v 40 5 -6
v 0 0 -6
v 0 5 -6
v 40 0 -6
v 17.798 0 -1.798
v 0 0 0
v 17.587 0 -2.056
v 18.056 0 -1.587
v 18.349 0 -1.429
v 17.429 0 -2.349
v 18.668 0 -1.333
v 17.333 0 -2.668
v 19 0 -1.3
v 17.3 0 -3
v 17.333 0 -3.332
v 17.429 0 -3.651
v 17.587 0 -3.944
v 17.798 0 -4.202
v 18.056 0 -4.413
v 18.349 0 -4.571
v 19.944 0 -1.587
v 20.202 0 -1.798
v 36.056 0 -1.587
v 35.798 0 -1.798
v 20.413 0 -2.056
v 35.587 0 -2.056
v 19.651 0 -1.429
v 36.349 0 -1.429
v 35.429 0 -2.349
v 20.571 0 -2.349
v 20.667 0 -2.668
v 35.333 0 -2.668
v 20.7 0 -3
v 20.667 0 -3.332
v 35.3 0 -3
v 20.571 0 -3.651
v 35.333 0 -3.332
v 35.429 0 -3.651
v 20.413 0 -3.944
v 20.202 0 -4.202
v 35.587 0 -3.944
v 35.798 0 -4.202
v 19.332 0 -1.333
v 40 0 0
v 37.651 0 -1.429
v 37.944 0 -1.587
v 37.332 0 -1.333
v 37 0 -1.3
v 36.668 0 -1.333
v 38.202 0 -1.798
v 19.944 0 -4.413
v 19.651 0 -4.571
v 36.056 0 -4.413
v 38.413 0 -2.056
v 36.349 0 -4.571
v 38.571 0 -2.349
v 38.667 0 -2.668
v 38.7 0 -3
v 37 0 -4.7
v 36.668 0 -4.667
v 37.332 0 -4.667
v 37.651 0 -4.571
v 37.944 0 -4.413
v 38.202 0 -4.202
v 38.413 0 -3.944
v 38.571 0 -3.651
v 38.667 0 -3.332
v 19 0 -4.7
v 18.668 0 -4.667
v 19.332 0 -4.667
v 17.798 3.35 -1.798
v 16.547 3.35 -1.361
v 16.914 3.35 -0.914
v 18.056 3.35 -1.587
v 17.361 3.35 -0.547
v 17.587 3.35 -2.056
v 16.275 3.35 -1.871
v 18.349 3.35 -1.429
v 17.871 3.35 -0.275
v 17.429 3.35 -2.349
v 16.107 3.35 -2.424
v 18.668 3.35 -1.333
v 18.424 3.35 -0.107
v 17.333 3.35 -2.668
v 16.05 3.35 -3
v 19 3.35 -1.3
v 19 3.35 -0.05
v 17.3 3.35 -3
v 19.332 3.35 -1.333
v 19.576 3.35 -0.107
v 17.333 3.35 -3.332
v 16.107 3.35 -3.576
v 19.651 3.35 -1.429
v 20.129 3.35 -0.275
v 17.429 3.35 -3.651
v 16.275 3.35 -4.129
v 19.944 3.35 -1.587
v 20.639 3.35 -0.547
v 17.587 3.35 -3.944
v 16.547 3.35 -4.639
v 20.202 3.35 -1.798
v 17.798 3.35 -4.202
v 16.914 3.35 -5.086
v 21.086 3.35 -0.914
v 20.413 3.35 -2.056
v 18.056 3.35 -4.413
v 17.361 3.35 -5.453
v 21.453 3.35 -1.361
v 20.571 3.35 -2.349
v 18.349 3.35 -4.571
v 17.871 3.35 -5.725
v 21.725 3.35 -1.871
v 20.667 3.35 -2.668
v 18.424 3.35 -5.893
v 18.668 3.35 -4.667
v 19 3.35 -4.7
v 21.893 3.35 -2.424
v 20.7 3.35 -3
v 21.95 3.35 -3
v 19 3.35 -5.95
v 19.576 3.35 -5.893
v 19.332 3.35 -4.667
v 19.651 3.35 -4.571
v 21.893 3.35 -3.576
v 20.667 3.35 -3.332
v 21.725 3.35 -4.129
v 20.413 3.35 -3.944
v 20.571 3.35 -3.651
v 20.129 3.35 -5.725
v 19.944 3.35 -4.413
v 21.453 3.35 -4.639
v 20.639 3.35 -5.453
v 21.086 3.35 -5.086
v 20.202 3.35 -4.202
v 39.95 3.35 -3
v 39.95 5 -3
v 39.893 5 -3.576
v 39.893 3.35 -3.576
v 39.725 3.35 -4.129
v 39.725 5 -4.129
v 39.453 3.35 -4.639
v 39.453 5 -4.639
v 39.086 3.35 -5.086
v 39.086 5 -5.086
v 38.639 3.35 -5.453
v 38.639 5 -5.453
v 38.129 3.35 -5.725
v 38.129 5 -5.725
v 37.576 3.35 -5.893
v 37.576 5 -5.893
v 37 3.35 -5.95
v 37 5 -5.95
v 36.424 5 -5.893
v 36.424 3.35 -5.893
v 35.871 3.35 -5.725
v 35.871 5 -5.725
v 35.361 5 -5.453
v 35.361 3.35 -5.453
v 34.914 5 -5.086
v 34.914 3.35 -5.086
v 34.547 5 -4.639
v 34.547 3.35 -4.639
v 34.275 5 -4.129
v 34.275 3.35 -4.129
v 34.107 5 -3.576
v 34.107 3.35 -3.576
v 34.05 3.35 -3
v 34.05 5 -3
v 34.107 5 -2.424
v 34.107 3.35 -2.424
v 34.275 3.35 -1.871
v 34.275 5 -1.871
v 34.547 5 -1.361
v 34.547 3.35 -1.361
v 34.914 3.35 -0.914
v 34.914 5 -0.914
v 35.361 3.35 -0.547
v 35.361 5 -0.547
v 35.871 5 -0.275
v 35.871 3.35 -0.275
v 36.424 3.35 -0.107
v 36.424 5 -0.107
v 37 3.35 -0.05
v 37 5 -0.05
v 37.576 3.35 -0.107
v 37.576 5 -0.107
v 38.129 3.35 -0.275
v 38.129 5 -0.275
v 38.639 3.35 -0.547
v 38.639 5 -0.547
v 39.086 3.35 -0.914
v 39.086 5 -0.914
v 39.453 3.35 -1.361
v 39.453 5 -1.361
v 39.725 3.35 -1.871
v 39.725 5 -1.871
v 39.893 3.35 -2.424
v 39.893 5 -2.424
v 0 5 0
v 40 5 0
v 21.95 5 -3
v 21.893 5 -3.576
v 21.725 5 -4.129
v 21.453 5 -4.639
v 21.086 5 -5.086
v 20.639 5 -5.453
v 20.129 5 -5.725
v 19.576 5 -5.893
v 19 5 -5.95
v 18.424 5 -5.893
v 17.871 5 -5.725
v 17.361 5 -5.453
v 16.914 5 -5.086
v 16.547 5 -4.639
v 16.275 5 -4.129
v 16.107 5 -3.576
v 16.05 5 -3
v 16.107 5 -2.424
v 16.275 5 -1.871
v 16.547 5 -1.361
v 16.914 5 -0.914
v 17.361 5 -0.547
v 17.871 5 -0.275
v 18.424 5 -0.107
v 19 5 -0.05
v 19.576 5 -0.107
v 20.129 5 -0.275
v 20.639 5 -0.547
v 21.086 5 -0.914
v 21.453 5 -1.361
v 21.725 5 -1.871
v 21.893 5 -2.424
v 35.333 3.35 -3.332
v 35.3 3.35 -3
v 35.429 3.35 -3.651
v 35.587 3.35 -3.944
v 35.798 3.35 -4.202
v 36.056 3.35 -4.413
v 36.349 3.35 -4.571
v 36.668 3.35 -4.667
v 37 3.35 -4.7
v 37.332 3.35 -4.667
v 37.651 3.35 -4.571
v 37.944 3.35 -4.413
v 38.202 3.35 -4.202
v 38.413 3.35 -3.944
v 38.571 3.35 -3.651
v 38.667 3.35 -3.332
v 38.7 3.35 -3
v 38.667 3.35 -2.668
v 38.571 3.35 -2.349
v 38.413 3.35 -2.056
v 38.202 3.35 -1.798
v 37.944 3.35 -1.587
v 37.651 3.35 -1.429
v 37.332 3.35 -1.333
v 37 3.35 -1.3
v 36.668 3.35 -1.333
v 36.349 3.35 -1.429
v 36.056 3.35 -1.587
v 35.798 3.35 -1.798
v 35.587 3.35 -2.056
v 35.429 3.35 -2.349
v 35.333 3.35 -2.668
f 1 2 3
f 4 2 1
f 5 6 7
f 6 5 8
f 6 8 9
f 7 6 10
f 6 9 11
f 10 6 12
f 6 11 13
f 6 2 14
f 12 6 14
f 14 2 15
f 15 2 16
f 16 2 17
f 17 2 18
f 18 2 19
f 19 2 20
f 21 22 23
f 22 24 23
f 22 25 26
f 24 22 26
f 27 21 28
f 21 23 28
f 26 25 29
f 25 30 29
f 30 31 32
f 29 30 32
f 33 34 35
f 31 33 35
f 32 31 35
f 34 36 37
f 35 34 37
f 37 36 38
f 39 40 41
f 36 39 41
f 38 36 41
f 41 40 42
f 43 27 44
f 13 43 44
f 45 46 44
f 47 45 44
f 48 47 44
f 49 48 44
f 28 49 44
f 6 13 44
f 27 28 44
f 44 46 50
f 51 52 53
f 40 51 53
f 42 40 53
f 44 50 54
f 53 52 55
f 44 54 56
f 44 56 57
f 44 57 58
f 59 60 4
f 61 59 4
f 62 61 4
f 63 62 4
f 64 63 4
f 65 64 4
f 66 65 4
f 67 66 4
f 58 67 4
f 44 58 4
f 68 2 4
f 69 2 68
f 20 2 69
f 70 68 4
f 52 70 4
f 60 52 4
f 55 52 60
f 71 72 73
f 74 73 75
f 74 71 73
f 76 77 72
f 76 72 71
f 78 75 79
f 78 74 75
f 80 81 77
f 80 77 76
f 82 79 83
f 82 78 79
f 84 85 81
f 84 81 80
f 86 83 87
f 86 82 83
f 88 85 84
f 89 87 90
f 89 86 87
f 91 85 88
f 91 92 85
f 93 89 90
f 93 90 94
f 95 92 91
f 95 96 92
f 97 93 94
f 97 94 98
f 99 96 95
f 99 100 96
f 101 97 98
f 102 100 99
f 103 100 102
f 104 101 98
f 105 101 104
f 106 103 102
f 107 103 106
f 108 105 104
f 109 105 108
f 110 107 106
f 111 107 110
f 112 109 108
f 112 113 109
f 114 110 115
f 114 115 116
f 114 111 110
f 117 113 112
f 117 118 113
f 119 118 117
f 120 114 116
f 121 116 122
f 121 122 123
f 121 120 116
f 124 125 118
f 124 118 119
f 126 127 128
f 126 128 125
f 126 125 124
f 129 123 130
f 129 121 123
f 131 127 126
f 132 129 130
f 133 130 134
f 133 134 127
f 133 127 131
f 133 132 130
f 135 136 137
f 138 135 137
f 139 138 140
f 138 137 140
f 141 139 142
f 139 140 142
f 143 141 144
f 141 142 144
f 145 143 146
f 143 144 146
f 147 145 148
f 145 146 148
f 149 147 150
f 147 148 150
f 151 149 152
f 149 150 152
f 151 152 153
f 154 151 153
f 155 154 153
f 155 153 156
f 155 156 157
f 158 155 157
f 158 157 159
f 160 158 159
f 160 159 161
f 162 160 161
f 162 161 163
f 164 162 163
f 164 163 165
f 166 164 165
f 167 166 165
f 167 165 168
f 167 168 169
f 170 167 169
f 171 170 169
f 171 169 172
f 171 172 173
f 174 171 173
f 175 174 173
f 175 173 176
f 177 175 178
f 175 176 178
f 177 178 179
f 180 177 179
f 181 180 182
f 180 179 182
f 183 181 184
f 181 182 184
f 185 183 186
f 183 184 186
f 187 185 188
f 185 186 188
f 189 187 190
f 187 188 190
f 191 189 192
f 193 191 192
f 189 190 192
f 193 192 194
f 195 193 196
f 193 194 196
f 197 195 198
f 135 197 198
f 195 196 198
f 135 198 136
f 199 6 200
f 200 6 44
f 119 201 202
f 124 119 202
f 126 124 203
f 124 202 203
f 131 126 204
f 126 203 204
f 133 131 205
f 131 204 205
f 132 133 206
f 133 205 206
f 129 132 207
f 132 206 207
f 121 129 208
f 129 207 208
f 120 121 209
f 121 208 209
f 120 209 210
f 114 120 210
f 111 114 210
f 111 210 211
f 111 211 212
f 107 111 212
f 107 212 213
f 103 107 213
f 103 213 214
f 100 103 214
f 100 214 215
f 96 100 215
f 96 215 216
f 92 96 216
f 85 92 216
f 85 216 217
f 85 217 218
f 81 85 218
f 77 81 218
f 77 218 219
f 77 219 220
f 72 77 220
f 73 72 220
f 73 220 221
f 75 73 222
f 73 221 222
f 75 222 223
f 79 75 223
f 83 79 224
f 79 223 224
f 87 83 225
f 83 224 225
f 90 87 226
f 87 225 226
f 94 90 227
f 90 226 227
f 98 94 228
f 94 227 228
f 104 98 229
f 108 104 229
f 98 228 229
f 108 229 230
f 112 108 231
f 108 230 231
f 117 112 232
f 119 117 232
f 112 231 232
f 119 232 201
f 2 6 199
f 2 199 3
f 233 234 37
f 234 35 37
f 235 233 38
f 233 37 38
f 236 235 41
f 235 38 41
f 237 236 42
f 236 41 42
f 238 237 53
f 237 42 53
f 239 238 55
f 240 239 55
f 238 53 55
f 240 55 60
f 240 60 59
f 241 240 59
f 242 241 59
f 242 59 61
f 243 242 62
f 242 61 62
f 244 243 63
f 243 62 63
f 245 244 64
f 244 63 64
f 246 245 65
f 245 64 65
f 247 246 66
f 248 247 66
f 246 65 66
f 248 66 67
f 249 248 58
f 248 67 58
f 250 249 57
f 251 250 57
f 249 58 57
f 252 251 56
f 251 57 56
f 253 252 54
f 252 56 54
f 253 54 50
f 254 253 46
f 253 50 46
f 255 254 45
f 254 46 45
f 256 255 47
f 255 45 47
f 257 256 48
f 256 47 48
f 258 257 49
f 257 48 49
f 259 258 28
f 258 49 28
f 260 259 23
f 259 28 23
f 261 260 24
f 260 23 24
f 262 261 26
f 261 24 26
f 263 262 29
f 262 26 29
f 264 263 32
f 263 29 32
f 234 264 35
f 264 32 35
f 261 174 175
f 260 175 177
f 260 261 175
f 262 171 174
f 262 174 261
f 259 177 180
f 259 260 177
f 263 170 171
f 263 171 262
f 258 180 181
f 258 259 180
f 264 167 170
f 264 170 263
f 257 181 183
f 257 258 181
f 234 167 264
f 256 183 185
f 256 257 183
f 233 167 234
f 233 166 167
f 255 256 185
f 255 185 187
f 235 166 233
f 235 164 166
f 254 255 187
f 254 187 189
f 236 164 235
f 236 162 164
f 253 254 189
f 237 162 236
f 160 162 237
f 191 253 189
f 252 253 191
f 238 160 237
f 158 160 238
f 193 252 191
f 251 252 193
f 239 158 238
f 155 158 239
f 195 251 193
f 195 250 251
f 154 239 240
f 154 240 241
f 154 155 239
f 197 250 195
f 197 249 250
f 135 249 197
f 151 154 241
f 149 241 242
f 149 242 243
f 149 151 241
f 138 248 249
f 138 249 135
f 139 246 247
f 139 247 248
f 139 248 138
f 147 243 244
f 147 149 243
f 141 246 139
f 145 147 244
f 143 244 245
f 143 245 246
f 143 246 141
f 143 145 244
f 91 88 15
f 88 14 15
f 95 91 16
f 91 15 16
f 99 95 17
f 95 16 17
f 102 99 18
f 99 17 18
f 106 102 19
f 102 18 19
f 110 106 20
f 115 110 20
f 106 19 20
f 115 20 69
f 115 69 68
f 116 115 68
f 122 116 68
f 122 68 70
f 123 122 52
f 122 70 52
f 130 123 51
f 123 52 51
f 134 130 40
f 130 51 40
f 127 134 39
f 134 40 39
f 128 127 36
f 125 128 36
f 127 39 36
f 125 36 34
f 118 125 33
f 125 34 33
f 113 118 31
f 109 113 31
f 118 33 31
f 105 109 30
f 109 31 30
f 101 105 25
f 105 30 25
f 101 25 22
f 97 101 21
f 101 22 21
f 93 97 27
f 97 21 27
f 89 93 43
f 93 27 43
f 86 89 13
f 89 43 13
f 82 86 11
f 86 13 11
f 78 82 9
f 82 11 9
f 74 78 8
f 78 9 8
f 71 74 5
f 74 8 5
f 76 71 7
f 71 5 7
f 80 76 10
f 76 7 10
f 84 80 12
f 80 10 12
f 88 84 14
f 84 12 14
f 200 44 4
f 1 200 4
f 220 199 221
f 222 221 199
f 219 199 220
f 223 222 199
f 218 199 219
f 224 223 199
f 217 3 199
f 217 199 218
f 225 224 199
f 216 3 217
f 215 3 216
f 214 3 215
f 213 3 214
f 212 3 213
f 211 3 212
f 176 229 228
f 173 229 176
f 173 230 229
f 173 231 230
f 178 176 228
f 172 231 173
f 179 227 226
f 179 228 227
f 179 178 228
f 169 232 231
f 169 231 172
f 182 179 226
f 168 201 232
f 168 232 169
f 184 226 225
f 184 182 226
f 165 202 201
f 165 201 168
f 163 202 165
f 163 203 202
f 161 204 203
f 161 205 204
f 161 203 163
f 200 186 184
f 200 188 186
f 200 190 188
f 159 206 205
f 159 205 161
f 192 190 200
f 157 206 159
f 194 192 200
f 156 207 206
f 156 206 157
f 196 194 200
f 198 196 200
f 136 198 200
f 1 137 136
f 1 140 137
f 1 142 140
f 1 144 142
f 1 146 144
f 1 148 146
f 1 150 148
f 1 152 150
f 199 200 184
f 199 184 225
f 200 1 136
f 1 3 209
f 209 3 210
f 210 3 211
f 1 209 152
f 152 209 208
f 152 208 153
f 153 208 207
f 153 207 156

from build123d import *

# Parameters (mm, degrees)
SKETCH1_W                       = 40
SKETCH1_H                       = 6
BOSS_EXTRUDE1_DEPTH             = 5
CBORE_FOR_M3_SBHCS1_D           = 3.4
CBORE_FOR_M3_SBHCS1_DEPTH       = 7.5
CBORE_FOR_M3_SBHCS1_CBORE_D     = 5.9
CBORE_FOR_M3_SBHCS1_CBORE_DEPTH = 1.65
CBORE_FOR_M3_SBHCS1_TIP         = 1.021463052


with BuildPart() as part:
    # Sketch1 → Boss-Extrude1 (new body)
    with BuildSketch(Plane(origin=(0, 0, 0), x_dir=(1, 0, 0), z_dir=(0, 1, 0))):
        with Locations((20, 3)):
            Rectangle(SKETCH1_W, SKETCH1_H)
    extrude(amount=BOSS_EXTRUDE1_DEPTH)

    # CBORE for M3 SBHCS1
    with Locations(Plane(origin=(0, 5, 0), x_dir=(1, 0, 0), z_dir=(0, 1, 0))):
        with Locations((37, 3), (19, 3)):
            CounterBoreHole(CBORE_FOR_M3_SBHCS1_D / 2, CBORE_FOR_M3_SBHCS1_CBORE_D / 2, CBORE_FOR_M3_SBHCS1_CBORE_DEPTH, depth=CBORE_FOR_M3_SBHCS1_DEPTH)
            with Locations((0, 0, -(CBORE_FOR_M3_SBHCS1_DEPTH + CBORE_FOR_M3_SBHCS1_TIP / 2))):  # 118° drill point
                Cone(0, CBORE_FOR_M3_SBHCS1_D / 2, CBORE_FOR_M3_SBHCS1_TIP, mode=Mode.SUBTRACT)


solid = part.part
